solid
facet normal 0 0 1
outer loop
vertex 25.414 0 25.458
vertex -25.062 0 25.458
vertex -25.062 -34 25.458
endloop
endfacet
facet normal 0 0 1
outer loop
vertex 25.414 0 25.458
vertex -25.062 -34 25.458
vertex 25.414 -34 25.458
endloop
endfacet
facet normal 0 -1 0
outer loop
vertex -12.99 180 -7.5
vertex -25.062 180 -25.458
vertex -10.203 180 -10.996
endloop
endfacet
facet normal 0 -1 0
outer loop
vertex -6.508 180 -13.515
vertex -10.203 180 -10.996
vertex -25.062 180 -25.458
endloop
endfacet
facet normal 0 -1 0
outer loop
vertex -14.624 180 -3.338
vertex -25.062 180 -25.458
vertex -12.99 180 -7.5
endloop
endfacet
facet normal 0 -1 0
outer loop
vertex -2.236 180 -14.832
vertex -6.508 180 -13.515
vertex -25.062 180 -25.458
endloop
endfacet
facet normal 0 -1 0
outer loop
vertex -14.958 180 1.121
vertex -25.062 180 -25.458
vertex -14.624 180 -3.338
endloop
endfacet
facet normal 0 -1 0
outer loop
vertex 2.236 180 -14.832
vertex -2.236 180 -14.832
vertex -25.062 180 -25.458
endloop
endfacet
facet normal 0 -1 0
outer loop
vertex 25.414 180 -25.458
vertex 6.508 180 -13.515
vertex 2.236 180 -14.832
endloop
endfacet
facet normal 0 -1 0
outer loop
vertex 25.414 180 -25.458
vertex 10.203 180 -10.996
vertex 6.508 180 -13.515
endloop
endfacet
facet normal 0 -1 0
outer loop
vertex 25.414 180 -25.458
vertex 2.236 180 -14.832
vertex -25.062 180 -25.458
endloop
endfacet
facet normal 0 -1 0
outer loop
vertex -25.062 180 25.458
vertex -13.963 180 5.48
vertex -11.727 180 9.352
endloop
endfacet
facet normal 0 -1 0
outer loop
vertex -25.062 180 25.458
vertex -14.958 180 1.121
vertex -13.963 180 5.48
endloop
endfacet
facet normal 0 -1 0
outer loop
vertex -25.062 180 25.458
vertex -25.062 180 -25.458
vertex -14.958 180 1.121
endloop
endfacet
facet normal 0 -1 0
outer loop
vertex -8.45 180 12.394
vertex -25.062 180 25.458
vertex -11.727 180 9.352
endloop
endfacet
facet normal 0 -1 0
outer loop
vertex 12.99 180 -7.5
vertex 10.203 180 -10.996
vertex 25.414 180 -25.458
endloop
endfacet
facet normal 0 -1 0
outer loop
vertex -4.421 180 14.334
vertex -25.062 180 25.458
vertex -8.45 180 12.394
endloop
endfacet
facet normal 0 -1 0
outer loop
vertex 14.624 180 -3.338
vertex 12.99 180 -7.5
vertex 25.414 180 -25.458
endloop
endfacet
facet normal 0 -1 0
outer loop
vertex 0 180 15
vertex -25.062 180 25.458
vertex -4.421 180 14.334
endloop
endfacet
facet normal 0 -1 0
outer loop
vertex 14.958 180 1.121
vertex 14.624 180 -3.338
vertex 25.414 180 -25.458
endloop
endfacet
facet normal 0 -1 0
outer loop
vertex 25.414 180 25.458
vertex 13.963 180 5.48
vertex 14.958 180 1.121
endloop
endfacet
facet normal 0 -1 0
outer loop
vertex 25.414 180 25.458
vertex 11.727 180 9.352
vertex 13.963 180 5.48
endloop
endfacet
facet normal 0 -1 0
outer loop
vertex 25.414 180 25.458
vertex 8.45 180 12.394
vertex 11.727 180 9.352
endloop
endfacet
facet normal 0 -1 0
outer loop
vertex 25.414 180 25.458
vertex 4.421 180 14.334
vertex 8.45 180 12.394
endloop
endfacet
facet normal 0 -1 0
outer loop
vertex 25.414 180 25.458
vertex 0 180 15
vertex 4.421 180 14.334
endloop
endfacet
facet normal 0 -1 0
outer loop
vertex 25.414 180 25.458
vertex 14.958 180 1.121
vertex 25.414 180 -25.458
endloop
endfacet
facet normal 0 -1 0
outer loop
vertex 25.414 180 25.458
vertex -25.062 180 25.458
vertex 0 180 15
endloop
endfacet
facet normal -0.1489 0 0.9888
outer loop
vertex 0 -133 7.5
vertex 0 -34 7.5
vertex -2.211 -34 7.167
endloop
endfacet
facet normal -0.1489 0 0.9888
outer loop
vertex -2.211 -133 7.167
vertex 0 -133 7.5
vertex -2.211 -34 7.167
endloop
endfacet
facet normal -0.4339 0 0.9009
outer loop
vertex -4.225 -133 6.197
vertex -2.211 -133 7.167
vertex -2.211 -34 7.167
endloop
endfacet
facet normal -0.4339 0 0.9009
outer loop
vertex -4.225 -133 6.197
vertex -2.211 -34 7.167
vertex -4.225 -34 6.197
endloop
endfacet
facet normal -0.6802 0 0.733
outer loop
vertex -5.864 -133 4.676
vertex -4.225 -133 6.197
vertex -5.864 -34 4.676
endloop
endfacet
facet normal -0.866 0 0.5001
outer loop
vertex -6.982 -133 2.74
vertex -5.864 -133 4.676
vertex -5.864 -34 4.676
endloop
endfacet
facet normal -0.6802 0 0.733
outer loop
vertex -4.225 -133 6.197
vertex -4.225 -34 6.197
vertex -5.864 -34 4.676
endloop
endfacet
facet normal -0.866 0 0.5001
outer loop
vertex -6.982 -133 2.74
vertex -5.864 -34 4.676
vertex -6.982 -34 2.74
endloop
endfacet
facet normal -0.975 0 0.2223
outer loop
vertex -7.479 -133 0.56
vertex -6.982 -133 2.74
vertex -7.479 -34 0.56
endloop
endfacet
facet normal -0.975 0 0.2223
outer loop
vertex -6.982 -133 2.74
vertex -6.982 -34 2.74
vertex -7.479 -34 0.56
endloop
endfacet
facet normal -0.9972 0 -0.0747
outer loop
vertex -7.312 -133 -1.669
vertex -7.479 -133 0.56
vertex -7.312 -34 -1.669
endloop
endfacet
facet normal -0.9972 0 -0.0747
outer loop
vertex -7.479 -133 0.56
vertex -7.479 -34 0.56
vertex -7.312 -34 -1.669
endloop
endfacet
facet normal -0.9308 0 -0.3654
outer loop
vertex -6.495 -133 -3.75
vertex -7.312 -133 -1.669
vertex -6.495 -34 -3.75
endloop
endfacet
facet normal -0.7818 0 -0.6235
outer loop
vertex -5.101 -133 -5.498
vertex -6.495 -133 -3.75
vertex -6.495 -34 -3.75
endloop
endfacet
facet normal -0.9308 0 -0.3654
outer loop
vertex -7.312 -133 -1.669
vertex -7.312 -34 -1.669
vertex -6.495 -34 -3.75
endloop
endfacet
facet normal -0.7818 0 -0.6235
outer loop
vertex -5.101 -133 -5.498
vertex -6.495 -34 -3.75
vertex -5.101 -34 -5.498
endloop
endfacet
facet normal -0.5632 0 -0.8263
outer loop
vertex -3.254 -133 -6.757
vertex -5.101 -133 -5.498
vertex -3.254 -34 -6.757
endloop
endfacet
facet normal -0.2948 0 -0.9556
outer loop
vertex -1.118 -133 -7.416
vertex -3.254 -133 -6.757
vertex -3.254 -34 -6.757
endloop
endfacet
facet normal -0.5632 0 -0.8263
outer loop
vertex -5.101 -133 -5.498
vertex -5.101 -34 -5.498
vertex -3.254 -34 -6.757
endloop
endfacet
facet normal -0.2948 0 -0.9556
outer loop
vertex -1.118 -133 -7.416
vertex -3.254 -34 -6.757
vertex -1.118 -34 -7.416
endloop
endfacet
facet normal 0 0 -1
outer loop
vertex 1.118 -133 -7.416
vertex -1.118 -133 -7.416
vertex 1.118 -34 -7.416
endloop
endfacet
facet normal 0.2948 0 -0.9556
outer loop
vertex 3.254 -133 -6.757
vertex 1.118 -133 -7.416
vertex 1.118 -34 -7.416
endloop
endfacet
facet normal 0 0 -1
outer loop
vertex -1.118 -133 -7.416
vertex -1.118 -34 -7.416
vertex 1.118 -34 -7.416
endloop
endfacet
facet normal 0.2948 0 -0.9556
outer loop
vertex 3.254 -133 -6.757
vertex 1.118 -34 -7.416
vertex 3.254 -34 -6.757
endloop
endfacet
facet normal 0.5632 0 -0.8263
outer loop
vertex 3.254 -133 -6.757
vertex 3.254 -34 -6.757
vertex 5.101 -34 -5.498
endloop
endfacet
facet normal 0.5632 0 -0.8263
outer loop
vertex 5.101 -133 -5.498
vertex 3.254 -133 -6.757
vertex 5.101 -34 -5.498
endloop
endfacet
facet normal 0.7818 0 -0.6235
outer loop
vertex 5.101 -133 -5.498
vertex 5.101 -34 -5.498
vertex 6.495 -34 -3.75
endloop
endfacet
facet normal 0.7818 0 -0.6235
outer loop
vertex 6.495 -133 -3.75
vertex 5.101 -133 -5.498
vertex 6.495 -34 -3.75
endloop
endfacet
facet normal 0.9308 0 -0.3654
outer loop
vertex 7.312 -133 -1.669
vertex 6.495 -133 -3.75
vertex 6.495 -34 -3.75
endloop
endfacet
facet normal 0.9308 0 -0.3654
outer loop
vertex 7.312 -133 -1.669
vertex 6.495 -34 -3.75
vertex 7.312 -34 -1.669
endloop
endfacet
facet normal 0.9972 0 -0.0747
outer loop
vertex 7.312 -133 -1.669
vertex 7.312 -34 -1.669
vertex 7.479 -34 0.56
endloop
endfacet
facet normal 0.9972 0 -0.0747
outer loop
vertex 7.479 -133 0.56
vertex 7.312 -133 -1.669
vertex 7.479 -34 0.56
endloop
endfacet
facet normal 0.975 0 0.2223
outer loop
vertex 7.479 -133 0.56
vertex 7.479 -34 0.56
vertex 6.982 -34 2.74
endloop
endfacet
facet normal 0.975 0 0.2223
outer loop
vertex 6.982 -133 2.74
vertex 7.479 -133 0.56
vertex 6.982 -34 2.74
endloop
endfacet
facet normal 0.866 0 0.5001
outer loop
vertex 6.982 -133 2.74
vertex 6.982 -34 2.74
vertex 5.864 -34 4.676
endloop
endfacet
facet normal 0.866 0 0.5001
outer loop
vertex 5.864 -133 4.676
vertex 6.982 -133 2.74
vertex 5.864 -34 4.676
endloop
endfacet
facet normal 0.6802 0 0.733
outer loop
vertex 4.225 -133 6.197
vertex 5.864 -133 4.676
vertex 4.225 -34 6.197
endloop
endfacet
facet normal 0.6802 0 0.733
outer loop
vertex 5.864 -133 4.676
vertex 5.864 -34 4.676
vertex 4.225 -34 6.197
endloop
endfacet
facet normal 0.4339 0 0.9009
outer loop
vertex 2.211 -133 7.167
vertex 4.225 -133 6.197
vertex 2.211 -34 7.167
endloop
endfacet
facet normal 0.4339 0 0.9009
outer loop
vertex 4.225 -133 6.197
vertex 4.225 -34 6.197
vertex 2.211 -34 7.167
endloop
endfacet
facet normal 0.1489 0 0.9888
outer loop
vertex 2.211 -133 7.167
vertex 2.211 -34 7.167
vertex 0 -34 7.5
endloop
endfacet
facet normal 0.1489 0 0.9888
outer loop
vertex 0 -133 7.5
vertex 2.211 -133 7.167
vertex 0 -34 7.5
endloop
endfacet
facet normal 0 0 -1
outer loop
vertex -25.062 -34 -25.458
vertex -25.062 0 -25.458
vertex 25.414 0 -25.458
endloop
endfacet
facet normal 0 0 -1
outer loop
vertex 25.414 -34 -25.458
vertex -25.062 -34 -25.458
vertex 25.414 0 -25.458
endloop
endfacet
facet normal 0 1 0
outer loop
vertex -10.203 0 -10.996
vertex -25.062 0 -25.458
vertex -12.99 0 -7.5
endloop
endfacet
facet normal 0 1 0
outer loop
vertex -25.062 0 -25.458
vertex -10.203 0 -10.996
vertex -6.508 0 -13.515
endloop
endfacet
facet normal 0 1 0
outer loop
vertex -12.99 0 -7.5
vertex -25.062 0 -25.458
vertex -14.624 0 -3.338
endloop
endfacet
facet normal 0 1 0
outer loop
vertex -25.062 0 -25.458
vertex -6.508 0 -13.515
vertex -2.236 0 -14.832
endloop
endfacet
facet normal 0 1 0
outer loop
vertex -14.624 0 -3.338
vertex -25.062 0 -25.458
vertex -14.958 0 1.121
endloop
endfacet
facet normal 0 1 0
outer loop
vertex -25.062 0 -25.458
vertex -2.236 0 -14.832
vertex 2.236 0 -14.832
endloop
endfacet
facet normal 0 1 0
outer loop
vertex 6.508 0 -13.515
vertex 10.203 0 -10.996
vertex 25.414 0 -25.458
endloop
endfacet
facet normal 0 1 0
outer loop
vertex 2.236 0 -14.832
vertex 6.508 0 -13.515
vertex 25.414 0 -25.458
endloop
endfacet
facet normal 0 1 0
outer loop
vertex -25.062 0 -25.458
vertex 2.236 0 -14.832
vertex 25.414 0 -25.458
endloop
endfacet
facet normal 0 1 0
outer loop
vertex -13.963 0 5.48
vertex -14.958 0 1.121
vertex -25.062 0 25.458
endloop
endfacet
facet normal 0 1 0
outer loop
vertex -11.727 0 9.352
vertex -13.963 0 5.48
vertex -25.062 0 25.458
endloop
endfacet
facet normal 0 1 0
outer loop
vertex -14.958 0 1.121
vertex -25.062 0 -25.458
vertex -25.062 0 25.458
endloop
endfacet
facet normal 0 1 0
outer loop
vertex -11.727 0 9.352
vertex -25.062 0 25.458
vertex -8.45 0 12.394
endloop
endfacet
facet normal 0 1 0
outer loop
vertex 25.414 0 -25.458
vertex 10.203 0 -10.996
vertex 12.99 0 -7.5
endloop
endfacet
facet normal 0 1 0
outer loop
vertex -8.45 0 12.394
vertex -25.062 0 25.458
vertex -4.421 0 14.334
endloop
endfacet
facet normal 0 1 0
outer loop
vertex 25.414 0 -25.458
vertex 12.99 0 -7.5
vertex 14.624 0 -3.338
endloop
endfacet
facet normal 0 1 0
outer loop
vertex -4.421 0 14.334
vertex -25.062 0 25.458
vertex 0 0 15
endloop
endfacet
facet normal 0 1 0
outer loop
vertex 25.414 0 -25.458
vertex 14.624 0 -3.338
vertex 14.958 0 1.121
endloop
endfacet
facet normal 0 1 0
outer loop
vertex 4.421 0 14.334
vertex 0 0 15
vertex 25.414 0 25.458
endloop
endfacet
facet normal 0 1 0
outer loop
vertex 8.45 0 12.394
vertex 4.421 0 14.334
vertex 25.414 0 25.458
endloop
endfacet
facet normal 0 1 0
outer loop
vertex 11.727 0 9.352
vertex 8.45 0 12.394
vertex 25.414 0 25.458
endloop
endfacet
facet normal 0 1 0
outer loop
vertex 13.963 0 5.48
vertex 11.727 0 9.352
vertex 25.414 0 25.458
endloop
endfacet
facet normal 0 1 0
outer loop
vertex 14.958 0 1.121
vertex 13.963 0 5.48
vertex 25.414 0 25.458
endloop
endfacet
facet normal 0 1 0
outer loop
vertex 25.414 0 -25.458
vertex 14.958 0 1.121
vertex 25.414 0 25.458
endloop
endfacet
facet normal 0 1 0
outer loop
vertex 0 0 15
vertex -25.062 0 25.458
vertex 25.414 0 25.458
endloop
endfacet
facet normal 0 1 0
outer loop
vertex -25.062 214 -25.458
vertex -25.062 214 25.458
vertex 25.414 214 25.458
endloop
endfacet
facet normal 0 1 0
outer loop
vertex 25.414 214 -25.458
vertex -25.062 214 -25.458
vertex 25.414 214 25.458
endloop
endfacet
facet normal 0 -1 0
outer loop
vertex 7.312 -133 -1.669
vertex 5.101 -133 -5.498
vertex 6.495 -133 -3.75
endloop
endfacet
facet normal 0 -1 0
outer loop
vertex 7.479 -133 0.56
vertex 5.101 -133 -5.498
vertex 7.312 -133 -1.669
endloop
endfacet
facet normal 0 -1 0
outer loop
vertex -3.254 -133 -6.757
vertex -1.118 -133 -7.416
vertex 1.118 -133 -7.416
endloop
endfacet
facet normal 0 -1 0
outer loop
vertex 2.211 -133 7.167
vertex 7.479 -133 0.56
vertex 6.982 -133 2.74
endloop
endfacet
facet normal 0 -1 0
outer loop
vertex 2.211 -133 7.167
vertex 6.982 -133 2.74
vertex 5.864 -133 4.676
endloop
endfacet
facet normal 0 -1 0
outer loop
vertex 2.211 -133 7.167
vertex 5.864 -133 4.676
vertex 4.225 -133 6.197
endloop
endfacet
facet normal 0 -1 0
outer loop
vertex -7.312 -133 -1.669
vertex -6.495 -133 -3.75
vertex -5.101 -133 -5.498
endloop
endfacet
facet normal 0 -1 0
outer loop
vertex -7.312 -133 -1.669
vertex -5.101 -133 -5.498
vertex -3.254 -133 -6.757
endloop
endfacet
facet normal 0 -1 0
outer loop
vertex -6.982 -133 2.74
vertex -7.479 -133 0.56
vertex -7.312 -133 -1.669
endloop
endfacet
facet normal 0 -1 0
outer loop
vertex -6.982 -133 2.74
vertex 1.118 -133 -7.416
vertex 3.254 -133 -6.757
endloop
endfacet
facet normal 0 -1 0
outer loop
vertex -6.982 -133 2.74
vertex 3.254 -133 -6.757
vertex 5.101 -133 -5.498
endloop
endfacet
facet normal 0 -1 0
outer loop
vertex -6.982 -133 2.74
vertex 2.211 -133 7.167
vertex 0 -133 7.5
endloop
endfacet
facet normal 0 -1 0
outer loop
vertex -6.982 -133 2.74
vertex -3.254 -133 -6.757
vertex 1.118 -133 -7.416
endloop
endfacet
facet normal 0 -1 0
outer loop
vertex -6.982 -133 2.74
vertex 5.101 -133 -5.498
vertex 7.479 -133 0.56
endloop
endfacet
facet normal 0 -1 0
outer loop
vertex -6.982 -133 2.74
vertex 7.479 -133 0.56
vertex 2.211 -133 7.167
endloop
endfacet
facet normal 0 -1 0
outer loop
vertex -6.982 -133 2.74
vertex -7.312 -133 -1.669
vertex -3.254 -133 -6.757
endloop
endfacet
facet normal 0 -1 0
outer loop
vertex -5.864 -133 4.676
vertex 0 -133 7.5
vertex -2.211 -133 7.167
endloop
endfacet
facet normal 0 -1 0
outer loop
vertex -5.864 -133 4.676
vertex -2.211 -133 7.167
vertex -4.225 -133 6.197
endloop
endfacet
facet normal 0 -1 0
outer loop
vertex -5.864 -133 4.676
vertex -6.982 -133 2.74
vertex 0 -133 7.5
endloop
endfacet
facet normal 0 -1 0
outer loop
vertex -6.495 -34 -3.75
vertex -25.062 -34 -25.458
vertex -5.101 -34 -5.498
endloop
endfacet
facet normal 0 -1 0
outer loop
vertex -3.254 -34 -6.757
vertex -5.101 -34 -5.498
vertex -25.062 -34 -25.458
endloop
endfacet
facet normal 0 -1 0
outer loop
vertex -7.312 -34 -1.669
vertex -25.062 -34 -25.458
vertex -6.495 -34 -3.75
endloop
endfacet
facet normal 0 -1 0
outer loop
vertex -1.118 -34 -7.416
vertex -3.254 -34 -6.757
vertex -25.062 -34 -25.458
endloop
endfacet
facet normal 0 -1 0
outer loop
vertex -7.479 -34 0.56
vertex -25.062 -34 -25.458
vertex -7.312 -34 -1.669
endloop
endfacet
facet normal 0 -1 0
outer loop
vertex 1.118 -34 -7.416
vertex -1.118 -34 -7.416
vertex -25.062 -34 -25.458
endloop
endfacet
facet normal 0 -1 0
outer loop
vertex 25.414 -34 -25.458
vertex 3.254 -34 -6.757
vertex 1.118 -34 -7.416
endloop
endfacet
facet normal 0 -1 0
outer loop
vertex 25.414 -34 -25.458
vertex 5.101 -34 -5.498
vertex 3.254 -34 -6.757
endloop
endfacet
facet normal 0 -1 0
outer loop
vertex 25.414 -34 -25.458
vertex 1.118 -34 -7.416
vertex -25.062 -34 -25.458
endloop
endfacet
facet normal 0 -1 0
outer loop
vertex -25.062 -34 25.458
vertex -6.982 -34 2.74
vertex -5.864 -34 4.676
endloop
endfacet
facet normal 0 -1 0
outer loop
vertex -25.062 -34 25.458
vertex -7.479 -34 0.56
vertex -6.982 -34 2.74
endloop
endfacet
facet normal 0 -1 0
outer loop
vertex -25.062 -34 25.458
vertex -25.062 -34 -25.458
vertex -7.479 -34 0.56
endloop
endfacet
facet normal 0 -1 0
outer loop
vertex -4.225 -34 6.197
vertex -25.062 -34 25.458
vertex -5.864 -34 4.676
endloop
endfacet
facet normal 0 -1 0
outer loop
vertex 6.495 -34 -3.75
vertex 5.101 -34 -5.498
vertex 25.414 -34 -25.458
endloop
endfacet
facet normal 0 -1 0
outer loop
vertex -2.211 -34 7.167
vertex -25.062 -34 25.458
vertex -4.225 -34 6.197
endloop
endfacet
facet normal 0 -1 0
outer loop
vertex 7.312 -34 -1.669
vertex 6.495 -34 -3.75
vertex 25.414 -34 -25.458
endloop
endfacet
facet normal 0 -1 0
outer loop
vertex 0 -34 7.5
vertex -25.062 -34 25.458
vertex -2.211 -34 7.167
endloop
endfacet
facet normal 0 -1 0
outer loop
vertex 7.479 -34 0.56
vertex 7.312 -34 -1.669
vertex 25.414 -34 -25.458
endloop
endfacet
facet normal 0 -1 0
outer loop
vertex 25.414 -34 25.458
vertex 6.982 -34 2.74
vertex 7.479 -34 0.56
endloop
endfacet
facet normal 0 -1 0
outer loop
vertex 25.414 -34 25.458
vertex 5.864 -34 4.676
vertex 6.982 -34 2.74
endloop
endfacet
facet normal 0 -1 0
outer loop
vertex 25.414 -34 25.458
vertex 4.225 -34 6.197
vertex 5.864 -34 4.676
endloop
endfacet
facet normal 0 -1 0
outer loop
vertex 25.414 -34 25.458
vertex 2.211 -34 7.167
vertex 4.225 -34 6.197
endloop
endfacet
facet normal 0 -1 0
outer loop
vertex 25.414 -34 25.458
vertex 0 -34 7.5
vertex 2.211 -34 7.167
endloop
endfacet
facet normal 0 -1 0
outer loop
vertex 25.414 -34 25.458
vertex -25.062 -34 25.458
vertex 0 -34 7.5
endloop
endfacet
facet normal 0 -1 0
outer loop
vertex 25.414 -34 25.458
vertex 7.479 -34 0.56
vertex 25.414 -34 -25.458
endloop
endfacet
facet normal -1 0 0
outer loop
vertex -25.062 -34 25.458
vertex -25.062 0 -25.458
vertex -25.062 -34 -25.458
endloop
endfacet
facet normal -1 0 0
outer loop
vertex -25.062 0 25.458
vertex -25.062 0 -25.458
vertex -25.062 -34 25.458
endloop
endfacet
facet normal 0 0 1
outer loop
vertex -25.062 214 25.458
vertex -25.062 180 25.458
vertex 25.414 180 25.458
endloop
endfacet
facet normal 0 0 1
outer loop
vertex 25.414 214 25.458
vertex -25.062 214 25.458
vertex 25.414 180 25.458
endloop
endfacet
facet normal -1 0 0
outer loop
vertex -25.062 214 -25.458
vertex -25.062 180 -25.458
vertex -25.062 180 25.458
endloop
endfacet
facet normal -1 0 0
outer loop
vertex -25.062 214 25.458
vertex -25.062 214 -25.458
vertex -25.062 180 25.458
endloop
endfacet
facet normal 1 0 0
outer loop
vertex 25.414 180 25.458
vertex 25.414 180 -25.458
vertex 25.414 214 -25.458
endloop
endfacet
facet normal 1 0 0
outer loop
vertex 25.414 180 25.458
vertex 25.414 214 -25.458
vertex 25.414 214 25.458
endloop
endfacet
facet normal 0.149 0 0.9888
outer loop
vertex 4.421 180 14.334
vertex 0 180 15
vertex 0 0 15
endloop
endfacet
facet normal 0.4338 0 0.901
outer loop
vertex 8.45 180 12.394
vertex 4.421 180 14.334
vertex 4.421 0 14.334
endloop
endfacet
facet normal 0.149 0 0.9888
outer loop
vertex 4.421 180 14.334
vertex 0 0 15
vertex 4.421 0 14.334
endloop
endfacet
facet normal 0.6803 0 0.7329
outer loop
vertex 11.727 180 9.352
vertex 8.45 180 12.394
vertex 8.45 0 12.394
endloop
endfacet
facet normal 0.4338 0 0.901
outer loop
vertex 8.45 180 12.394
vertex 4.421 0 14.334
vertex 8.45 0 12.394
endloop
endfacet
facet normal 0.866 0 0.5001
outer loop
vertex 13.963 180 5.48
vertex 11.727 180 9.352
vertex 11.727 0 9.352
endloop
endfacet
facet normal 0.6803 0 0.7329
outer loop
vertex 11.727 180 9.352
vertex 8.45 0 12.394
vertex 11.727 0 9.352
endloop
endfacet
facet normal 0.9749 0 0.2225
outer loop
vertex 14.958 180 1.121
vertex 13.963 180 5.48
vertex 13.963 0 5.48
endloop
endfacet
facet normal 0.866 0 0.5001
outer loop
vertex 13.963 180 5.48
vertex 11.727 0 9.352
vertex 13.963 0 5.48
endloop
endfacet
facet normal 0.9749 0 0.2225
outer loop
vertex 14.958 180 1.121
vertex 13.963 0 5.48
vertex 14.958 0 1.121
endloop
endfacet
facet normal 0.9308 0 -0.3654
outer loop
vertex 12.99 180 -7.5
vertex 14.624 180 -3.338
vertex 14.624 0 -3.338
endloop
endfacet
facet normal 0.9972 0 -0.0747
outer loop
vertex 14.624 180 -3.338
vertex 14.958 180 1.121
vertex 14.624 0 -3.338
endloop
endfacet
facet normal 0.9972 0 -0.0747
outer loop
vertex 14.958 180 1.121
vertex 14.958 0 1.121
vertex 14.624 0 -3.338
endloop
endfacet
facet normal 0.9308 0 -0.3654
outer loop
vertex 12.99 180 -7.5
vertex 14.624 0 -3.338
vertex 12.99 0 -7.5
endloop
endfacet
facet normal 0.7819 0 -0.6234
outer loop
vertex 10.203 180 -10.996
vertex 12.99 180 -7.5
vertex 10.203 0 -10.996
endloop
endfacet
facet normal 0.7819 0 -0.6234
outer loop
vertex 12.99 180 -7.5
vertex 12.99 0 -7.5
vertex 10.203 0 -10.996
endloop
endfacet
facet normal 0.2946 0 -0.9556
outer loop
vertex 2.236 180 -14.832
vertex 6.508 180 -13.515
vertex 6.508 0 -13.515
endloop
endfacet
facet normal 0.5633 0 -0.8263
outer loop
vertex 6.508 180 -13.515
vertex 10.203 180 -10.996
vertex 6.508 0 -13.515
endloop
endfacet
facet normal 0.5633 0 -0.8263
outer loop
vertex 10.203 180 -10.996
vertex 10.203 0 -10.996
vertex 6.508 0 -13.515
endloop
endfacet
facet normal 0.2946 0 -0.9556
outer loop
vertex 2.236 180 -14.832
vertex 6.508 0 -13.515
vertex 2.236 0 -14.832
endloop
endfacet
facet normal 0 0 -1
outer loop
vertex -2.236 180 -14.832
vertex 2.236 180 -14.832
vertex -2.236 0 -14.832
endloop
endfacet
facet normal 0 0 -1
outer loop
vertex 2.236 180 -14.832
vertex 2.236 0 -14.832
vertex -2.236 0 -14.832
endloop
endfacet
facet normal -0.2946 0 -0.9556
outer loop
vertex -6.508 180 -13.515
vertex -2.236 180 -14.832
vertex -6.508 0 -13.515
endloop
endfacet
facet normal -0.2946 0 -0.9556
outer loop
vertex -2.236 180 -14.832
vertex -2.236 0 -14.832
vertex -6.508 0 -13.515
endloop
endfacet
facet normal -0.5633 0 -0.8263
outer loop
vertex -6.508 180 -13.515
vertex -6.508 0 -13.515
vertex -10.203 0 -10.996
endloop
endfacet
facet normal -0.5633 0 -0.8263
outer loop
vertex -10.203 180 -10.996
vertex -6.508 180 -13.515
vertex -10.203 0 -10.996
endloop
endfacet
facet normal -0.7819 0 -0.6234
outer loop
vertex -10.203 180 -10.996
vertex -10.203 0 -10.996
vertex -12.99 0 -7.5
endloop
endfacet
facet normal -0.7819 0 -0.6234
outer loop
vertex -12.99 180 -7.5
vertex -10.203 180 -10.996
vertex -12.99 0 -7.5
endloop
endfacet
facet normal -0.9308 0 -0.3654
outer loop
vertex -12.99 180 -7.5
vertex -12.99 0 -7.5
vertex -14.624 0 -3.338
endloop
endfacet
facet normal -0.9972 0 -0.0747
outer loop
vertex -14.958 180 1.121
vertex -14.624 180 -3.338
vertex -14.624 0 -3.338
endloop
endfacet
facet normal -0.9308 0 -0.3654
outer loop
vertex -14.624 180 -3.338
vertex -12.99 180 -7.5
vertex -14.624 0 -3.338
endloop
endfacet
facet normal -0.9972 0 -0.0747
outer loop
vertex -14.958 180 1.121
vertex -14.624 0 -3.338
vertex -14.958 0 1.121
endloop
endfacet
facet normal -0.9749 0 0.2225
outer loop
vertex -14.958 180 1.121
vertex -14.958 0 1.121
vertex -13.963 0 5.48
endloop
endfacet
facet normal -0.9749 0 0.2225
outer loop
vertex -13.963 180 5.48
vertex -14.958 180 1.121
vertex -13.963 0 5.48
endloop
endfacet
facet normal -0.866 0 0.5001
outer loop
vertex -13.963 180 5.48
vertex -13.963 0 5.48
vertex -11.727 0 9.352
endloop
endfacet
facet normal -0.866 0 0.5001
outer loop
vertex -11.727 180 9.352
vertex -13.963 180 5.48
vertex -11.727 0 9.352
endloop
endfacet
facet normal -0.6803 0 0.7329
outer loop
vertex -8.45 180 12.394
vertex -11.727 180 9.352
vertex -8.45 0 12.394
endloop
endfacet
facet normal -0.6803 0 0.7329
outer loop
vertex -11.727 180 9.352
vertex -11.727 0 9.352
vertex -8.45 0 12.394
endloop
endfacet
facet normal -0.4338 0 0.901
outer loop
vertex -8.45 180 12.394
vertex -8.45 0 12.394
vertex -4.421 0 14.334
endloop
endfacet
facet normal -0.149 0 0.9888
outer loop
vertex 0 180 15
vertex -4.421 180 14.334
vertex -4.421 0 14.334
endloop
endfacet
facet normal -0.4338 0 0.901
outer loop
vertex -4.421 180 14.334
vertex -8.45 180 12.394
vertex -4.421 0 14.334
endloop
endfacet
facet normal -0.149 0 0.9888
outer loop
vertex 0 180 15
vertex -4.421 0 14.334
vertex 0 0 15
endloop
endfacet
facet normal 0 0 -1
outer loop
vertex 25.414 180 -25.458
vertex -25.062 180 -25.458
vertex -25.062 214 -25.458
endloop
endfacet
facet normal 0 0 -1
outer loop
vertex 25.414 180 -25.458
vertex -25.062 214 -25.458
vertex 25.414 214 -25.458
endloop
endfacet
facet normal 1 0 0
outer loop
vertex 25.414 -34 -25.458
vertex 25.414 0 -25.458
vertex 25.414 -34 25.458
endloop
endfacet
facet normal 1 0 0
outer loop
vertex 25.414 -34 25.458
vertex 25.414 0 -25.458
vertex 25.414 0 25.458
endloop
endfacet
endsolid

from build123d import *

# Parameters (mm, degrees)
SKETCH1_R           = 15
BOSS_EXTRUDE2_DEPTH = 194
SKETCH2_W           = 50.475671087
SKETCH2_H           = 50.915354634
BOSS_EXTRUDE3_DEPTH = 34
SKETCH3_R           = 7.5
BOSS_EXTRUDE4_DEPTH = 99


with BuildPart() as part:
    # Sketch1 → Boss-Extrude2 (new body)
    with BuildSketch(Plane(origin=(0, 0, 0), x_dir=(1, 0, 0), z_dir=(0, 1, 0))):
        with Locations(Location((0, 0, 0), (0, 0, 270))):
            Circle(SKETCH1_R)
    extrude(amount=BOSS_EXTRUDE2_DEPTH)

    # Sketch2 → Boss-Extrude3 (add)
    with BuildSketch(Plane.XZ):
        with Locations((0.175873419, 0)):
            Rectangle(SKETCH2_W, SKETCH2_H)
    boss_extrude3 = extrude(amount=BOSS_EXTRUDE3_DEPTH)

    # Mirror1: Boss-Extrude3 across plane
    add(boss_extrude3.mirror(Plane.ZX.offset(90)))

    # Sketch3 → Boss-Extrude4 (add)
    with BuildSketch(Plane.XZ.offset(34)):
        with Locations(Location((0, 0, 0), (0, 0, 90))):
            Circle(SKETCH3_R)
    extrude(amount=BOSS_EXTRUDE4_DEPTH)


solid = part.part
